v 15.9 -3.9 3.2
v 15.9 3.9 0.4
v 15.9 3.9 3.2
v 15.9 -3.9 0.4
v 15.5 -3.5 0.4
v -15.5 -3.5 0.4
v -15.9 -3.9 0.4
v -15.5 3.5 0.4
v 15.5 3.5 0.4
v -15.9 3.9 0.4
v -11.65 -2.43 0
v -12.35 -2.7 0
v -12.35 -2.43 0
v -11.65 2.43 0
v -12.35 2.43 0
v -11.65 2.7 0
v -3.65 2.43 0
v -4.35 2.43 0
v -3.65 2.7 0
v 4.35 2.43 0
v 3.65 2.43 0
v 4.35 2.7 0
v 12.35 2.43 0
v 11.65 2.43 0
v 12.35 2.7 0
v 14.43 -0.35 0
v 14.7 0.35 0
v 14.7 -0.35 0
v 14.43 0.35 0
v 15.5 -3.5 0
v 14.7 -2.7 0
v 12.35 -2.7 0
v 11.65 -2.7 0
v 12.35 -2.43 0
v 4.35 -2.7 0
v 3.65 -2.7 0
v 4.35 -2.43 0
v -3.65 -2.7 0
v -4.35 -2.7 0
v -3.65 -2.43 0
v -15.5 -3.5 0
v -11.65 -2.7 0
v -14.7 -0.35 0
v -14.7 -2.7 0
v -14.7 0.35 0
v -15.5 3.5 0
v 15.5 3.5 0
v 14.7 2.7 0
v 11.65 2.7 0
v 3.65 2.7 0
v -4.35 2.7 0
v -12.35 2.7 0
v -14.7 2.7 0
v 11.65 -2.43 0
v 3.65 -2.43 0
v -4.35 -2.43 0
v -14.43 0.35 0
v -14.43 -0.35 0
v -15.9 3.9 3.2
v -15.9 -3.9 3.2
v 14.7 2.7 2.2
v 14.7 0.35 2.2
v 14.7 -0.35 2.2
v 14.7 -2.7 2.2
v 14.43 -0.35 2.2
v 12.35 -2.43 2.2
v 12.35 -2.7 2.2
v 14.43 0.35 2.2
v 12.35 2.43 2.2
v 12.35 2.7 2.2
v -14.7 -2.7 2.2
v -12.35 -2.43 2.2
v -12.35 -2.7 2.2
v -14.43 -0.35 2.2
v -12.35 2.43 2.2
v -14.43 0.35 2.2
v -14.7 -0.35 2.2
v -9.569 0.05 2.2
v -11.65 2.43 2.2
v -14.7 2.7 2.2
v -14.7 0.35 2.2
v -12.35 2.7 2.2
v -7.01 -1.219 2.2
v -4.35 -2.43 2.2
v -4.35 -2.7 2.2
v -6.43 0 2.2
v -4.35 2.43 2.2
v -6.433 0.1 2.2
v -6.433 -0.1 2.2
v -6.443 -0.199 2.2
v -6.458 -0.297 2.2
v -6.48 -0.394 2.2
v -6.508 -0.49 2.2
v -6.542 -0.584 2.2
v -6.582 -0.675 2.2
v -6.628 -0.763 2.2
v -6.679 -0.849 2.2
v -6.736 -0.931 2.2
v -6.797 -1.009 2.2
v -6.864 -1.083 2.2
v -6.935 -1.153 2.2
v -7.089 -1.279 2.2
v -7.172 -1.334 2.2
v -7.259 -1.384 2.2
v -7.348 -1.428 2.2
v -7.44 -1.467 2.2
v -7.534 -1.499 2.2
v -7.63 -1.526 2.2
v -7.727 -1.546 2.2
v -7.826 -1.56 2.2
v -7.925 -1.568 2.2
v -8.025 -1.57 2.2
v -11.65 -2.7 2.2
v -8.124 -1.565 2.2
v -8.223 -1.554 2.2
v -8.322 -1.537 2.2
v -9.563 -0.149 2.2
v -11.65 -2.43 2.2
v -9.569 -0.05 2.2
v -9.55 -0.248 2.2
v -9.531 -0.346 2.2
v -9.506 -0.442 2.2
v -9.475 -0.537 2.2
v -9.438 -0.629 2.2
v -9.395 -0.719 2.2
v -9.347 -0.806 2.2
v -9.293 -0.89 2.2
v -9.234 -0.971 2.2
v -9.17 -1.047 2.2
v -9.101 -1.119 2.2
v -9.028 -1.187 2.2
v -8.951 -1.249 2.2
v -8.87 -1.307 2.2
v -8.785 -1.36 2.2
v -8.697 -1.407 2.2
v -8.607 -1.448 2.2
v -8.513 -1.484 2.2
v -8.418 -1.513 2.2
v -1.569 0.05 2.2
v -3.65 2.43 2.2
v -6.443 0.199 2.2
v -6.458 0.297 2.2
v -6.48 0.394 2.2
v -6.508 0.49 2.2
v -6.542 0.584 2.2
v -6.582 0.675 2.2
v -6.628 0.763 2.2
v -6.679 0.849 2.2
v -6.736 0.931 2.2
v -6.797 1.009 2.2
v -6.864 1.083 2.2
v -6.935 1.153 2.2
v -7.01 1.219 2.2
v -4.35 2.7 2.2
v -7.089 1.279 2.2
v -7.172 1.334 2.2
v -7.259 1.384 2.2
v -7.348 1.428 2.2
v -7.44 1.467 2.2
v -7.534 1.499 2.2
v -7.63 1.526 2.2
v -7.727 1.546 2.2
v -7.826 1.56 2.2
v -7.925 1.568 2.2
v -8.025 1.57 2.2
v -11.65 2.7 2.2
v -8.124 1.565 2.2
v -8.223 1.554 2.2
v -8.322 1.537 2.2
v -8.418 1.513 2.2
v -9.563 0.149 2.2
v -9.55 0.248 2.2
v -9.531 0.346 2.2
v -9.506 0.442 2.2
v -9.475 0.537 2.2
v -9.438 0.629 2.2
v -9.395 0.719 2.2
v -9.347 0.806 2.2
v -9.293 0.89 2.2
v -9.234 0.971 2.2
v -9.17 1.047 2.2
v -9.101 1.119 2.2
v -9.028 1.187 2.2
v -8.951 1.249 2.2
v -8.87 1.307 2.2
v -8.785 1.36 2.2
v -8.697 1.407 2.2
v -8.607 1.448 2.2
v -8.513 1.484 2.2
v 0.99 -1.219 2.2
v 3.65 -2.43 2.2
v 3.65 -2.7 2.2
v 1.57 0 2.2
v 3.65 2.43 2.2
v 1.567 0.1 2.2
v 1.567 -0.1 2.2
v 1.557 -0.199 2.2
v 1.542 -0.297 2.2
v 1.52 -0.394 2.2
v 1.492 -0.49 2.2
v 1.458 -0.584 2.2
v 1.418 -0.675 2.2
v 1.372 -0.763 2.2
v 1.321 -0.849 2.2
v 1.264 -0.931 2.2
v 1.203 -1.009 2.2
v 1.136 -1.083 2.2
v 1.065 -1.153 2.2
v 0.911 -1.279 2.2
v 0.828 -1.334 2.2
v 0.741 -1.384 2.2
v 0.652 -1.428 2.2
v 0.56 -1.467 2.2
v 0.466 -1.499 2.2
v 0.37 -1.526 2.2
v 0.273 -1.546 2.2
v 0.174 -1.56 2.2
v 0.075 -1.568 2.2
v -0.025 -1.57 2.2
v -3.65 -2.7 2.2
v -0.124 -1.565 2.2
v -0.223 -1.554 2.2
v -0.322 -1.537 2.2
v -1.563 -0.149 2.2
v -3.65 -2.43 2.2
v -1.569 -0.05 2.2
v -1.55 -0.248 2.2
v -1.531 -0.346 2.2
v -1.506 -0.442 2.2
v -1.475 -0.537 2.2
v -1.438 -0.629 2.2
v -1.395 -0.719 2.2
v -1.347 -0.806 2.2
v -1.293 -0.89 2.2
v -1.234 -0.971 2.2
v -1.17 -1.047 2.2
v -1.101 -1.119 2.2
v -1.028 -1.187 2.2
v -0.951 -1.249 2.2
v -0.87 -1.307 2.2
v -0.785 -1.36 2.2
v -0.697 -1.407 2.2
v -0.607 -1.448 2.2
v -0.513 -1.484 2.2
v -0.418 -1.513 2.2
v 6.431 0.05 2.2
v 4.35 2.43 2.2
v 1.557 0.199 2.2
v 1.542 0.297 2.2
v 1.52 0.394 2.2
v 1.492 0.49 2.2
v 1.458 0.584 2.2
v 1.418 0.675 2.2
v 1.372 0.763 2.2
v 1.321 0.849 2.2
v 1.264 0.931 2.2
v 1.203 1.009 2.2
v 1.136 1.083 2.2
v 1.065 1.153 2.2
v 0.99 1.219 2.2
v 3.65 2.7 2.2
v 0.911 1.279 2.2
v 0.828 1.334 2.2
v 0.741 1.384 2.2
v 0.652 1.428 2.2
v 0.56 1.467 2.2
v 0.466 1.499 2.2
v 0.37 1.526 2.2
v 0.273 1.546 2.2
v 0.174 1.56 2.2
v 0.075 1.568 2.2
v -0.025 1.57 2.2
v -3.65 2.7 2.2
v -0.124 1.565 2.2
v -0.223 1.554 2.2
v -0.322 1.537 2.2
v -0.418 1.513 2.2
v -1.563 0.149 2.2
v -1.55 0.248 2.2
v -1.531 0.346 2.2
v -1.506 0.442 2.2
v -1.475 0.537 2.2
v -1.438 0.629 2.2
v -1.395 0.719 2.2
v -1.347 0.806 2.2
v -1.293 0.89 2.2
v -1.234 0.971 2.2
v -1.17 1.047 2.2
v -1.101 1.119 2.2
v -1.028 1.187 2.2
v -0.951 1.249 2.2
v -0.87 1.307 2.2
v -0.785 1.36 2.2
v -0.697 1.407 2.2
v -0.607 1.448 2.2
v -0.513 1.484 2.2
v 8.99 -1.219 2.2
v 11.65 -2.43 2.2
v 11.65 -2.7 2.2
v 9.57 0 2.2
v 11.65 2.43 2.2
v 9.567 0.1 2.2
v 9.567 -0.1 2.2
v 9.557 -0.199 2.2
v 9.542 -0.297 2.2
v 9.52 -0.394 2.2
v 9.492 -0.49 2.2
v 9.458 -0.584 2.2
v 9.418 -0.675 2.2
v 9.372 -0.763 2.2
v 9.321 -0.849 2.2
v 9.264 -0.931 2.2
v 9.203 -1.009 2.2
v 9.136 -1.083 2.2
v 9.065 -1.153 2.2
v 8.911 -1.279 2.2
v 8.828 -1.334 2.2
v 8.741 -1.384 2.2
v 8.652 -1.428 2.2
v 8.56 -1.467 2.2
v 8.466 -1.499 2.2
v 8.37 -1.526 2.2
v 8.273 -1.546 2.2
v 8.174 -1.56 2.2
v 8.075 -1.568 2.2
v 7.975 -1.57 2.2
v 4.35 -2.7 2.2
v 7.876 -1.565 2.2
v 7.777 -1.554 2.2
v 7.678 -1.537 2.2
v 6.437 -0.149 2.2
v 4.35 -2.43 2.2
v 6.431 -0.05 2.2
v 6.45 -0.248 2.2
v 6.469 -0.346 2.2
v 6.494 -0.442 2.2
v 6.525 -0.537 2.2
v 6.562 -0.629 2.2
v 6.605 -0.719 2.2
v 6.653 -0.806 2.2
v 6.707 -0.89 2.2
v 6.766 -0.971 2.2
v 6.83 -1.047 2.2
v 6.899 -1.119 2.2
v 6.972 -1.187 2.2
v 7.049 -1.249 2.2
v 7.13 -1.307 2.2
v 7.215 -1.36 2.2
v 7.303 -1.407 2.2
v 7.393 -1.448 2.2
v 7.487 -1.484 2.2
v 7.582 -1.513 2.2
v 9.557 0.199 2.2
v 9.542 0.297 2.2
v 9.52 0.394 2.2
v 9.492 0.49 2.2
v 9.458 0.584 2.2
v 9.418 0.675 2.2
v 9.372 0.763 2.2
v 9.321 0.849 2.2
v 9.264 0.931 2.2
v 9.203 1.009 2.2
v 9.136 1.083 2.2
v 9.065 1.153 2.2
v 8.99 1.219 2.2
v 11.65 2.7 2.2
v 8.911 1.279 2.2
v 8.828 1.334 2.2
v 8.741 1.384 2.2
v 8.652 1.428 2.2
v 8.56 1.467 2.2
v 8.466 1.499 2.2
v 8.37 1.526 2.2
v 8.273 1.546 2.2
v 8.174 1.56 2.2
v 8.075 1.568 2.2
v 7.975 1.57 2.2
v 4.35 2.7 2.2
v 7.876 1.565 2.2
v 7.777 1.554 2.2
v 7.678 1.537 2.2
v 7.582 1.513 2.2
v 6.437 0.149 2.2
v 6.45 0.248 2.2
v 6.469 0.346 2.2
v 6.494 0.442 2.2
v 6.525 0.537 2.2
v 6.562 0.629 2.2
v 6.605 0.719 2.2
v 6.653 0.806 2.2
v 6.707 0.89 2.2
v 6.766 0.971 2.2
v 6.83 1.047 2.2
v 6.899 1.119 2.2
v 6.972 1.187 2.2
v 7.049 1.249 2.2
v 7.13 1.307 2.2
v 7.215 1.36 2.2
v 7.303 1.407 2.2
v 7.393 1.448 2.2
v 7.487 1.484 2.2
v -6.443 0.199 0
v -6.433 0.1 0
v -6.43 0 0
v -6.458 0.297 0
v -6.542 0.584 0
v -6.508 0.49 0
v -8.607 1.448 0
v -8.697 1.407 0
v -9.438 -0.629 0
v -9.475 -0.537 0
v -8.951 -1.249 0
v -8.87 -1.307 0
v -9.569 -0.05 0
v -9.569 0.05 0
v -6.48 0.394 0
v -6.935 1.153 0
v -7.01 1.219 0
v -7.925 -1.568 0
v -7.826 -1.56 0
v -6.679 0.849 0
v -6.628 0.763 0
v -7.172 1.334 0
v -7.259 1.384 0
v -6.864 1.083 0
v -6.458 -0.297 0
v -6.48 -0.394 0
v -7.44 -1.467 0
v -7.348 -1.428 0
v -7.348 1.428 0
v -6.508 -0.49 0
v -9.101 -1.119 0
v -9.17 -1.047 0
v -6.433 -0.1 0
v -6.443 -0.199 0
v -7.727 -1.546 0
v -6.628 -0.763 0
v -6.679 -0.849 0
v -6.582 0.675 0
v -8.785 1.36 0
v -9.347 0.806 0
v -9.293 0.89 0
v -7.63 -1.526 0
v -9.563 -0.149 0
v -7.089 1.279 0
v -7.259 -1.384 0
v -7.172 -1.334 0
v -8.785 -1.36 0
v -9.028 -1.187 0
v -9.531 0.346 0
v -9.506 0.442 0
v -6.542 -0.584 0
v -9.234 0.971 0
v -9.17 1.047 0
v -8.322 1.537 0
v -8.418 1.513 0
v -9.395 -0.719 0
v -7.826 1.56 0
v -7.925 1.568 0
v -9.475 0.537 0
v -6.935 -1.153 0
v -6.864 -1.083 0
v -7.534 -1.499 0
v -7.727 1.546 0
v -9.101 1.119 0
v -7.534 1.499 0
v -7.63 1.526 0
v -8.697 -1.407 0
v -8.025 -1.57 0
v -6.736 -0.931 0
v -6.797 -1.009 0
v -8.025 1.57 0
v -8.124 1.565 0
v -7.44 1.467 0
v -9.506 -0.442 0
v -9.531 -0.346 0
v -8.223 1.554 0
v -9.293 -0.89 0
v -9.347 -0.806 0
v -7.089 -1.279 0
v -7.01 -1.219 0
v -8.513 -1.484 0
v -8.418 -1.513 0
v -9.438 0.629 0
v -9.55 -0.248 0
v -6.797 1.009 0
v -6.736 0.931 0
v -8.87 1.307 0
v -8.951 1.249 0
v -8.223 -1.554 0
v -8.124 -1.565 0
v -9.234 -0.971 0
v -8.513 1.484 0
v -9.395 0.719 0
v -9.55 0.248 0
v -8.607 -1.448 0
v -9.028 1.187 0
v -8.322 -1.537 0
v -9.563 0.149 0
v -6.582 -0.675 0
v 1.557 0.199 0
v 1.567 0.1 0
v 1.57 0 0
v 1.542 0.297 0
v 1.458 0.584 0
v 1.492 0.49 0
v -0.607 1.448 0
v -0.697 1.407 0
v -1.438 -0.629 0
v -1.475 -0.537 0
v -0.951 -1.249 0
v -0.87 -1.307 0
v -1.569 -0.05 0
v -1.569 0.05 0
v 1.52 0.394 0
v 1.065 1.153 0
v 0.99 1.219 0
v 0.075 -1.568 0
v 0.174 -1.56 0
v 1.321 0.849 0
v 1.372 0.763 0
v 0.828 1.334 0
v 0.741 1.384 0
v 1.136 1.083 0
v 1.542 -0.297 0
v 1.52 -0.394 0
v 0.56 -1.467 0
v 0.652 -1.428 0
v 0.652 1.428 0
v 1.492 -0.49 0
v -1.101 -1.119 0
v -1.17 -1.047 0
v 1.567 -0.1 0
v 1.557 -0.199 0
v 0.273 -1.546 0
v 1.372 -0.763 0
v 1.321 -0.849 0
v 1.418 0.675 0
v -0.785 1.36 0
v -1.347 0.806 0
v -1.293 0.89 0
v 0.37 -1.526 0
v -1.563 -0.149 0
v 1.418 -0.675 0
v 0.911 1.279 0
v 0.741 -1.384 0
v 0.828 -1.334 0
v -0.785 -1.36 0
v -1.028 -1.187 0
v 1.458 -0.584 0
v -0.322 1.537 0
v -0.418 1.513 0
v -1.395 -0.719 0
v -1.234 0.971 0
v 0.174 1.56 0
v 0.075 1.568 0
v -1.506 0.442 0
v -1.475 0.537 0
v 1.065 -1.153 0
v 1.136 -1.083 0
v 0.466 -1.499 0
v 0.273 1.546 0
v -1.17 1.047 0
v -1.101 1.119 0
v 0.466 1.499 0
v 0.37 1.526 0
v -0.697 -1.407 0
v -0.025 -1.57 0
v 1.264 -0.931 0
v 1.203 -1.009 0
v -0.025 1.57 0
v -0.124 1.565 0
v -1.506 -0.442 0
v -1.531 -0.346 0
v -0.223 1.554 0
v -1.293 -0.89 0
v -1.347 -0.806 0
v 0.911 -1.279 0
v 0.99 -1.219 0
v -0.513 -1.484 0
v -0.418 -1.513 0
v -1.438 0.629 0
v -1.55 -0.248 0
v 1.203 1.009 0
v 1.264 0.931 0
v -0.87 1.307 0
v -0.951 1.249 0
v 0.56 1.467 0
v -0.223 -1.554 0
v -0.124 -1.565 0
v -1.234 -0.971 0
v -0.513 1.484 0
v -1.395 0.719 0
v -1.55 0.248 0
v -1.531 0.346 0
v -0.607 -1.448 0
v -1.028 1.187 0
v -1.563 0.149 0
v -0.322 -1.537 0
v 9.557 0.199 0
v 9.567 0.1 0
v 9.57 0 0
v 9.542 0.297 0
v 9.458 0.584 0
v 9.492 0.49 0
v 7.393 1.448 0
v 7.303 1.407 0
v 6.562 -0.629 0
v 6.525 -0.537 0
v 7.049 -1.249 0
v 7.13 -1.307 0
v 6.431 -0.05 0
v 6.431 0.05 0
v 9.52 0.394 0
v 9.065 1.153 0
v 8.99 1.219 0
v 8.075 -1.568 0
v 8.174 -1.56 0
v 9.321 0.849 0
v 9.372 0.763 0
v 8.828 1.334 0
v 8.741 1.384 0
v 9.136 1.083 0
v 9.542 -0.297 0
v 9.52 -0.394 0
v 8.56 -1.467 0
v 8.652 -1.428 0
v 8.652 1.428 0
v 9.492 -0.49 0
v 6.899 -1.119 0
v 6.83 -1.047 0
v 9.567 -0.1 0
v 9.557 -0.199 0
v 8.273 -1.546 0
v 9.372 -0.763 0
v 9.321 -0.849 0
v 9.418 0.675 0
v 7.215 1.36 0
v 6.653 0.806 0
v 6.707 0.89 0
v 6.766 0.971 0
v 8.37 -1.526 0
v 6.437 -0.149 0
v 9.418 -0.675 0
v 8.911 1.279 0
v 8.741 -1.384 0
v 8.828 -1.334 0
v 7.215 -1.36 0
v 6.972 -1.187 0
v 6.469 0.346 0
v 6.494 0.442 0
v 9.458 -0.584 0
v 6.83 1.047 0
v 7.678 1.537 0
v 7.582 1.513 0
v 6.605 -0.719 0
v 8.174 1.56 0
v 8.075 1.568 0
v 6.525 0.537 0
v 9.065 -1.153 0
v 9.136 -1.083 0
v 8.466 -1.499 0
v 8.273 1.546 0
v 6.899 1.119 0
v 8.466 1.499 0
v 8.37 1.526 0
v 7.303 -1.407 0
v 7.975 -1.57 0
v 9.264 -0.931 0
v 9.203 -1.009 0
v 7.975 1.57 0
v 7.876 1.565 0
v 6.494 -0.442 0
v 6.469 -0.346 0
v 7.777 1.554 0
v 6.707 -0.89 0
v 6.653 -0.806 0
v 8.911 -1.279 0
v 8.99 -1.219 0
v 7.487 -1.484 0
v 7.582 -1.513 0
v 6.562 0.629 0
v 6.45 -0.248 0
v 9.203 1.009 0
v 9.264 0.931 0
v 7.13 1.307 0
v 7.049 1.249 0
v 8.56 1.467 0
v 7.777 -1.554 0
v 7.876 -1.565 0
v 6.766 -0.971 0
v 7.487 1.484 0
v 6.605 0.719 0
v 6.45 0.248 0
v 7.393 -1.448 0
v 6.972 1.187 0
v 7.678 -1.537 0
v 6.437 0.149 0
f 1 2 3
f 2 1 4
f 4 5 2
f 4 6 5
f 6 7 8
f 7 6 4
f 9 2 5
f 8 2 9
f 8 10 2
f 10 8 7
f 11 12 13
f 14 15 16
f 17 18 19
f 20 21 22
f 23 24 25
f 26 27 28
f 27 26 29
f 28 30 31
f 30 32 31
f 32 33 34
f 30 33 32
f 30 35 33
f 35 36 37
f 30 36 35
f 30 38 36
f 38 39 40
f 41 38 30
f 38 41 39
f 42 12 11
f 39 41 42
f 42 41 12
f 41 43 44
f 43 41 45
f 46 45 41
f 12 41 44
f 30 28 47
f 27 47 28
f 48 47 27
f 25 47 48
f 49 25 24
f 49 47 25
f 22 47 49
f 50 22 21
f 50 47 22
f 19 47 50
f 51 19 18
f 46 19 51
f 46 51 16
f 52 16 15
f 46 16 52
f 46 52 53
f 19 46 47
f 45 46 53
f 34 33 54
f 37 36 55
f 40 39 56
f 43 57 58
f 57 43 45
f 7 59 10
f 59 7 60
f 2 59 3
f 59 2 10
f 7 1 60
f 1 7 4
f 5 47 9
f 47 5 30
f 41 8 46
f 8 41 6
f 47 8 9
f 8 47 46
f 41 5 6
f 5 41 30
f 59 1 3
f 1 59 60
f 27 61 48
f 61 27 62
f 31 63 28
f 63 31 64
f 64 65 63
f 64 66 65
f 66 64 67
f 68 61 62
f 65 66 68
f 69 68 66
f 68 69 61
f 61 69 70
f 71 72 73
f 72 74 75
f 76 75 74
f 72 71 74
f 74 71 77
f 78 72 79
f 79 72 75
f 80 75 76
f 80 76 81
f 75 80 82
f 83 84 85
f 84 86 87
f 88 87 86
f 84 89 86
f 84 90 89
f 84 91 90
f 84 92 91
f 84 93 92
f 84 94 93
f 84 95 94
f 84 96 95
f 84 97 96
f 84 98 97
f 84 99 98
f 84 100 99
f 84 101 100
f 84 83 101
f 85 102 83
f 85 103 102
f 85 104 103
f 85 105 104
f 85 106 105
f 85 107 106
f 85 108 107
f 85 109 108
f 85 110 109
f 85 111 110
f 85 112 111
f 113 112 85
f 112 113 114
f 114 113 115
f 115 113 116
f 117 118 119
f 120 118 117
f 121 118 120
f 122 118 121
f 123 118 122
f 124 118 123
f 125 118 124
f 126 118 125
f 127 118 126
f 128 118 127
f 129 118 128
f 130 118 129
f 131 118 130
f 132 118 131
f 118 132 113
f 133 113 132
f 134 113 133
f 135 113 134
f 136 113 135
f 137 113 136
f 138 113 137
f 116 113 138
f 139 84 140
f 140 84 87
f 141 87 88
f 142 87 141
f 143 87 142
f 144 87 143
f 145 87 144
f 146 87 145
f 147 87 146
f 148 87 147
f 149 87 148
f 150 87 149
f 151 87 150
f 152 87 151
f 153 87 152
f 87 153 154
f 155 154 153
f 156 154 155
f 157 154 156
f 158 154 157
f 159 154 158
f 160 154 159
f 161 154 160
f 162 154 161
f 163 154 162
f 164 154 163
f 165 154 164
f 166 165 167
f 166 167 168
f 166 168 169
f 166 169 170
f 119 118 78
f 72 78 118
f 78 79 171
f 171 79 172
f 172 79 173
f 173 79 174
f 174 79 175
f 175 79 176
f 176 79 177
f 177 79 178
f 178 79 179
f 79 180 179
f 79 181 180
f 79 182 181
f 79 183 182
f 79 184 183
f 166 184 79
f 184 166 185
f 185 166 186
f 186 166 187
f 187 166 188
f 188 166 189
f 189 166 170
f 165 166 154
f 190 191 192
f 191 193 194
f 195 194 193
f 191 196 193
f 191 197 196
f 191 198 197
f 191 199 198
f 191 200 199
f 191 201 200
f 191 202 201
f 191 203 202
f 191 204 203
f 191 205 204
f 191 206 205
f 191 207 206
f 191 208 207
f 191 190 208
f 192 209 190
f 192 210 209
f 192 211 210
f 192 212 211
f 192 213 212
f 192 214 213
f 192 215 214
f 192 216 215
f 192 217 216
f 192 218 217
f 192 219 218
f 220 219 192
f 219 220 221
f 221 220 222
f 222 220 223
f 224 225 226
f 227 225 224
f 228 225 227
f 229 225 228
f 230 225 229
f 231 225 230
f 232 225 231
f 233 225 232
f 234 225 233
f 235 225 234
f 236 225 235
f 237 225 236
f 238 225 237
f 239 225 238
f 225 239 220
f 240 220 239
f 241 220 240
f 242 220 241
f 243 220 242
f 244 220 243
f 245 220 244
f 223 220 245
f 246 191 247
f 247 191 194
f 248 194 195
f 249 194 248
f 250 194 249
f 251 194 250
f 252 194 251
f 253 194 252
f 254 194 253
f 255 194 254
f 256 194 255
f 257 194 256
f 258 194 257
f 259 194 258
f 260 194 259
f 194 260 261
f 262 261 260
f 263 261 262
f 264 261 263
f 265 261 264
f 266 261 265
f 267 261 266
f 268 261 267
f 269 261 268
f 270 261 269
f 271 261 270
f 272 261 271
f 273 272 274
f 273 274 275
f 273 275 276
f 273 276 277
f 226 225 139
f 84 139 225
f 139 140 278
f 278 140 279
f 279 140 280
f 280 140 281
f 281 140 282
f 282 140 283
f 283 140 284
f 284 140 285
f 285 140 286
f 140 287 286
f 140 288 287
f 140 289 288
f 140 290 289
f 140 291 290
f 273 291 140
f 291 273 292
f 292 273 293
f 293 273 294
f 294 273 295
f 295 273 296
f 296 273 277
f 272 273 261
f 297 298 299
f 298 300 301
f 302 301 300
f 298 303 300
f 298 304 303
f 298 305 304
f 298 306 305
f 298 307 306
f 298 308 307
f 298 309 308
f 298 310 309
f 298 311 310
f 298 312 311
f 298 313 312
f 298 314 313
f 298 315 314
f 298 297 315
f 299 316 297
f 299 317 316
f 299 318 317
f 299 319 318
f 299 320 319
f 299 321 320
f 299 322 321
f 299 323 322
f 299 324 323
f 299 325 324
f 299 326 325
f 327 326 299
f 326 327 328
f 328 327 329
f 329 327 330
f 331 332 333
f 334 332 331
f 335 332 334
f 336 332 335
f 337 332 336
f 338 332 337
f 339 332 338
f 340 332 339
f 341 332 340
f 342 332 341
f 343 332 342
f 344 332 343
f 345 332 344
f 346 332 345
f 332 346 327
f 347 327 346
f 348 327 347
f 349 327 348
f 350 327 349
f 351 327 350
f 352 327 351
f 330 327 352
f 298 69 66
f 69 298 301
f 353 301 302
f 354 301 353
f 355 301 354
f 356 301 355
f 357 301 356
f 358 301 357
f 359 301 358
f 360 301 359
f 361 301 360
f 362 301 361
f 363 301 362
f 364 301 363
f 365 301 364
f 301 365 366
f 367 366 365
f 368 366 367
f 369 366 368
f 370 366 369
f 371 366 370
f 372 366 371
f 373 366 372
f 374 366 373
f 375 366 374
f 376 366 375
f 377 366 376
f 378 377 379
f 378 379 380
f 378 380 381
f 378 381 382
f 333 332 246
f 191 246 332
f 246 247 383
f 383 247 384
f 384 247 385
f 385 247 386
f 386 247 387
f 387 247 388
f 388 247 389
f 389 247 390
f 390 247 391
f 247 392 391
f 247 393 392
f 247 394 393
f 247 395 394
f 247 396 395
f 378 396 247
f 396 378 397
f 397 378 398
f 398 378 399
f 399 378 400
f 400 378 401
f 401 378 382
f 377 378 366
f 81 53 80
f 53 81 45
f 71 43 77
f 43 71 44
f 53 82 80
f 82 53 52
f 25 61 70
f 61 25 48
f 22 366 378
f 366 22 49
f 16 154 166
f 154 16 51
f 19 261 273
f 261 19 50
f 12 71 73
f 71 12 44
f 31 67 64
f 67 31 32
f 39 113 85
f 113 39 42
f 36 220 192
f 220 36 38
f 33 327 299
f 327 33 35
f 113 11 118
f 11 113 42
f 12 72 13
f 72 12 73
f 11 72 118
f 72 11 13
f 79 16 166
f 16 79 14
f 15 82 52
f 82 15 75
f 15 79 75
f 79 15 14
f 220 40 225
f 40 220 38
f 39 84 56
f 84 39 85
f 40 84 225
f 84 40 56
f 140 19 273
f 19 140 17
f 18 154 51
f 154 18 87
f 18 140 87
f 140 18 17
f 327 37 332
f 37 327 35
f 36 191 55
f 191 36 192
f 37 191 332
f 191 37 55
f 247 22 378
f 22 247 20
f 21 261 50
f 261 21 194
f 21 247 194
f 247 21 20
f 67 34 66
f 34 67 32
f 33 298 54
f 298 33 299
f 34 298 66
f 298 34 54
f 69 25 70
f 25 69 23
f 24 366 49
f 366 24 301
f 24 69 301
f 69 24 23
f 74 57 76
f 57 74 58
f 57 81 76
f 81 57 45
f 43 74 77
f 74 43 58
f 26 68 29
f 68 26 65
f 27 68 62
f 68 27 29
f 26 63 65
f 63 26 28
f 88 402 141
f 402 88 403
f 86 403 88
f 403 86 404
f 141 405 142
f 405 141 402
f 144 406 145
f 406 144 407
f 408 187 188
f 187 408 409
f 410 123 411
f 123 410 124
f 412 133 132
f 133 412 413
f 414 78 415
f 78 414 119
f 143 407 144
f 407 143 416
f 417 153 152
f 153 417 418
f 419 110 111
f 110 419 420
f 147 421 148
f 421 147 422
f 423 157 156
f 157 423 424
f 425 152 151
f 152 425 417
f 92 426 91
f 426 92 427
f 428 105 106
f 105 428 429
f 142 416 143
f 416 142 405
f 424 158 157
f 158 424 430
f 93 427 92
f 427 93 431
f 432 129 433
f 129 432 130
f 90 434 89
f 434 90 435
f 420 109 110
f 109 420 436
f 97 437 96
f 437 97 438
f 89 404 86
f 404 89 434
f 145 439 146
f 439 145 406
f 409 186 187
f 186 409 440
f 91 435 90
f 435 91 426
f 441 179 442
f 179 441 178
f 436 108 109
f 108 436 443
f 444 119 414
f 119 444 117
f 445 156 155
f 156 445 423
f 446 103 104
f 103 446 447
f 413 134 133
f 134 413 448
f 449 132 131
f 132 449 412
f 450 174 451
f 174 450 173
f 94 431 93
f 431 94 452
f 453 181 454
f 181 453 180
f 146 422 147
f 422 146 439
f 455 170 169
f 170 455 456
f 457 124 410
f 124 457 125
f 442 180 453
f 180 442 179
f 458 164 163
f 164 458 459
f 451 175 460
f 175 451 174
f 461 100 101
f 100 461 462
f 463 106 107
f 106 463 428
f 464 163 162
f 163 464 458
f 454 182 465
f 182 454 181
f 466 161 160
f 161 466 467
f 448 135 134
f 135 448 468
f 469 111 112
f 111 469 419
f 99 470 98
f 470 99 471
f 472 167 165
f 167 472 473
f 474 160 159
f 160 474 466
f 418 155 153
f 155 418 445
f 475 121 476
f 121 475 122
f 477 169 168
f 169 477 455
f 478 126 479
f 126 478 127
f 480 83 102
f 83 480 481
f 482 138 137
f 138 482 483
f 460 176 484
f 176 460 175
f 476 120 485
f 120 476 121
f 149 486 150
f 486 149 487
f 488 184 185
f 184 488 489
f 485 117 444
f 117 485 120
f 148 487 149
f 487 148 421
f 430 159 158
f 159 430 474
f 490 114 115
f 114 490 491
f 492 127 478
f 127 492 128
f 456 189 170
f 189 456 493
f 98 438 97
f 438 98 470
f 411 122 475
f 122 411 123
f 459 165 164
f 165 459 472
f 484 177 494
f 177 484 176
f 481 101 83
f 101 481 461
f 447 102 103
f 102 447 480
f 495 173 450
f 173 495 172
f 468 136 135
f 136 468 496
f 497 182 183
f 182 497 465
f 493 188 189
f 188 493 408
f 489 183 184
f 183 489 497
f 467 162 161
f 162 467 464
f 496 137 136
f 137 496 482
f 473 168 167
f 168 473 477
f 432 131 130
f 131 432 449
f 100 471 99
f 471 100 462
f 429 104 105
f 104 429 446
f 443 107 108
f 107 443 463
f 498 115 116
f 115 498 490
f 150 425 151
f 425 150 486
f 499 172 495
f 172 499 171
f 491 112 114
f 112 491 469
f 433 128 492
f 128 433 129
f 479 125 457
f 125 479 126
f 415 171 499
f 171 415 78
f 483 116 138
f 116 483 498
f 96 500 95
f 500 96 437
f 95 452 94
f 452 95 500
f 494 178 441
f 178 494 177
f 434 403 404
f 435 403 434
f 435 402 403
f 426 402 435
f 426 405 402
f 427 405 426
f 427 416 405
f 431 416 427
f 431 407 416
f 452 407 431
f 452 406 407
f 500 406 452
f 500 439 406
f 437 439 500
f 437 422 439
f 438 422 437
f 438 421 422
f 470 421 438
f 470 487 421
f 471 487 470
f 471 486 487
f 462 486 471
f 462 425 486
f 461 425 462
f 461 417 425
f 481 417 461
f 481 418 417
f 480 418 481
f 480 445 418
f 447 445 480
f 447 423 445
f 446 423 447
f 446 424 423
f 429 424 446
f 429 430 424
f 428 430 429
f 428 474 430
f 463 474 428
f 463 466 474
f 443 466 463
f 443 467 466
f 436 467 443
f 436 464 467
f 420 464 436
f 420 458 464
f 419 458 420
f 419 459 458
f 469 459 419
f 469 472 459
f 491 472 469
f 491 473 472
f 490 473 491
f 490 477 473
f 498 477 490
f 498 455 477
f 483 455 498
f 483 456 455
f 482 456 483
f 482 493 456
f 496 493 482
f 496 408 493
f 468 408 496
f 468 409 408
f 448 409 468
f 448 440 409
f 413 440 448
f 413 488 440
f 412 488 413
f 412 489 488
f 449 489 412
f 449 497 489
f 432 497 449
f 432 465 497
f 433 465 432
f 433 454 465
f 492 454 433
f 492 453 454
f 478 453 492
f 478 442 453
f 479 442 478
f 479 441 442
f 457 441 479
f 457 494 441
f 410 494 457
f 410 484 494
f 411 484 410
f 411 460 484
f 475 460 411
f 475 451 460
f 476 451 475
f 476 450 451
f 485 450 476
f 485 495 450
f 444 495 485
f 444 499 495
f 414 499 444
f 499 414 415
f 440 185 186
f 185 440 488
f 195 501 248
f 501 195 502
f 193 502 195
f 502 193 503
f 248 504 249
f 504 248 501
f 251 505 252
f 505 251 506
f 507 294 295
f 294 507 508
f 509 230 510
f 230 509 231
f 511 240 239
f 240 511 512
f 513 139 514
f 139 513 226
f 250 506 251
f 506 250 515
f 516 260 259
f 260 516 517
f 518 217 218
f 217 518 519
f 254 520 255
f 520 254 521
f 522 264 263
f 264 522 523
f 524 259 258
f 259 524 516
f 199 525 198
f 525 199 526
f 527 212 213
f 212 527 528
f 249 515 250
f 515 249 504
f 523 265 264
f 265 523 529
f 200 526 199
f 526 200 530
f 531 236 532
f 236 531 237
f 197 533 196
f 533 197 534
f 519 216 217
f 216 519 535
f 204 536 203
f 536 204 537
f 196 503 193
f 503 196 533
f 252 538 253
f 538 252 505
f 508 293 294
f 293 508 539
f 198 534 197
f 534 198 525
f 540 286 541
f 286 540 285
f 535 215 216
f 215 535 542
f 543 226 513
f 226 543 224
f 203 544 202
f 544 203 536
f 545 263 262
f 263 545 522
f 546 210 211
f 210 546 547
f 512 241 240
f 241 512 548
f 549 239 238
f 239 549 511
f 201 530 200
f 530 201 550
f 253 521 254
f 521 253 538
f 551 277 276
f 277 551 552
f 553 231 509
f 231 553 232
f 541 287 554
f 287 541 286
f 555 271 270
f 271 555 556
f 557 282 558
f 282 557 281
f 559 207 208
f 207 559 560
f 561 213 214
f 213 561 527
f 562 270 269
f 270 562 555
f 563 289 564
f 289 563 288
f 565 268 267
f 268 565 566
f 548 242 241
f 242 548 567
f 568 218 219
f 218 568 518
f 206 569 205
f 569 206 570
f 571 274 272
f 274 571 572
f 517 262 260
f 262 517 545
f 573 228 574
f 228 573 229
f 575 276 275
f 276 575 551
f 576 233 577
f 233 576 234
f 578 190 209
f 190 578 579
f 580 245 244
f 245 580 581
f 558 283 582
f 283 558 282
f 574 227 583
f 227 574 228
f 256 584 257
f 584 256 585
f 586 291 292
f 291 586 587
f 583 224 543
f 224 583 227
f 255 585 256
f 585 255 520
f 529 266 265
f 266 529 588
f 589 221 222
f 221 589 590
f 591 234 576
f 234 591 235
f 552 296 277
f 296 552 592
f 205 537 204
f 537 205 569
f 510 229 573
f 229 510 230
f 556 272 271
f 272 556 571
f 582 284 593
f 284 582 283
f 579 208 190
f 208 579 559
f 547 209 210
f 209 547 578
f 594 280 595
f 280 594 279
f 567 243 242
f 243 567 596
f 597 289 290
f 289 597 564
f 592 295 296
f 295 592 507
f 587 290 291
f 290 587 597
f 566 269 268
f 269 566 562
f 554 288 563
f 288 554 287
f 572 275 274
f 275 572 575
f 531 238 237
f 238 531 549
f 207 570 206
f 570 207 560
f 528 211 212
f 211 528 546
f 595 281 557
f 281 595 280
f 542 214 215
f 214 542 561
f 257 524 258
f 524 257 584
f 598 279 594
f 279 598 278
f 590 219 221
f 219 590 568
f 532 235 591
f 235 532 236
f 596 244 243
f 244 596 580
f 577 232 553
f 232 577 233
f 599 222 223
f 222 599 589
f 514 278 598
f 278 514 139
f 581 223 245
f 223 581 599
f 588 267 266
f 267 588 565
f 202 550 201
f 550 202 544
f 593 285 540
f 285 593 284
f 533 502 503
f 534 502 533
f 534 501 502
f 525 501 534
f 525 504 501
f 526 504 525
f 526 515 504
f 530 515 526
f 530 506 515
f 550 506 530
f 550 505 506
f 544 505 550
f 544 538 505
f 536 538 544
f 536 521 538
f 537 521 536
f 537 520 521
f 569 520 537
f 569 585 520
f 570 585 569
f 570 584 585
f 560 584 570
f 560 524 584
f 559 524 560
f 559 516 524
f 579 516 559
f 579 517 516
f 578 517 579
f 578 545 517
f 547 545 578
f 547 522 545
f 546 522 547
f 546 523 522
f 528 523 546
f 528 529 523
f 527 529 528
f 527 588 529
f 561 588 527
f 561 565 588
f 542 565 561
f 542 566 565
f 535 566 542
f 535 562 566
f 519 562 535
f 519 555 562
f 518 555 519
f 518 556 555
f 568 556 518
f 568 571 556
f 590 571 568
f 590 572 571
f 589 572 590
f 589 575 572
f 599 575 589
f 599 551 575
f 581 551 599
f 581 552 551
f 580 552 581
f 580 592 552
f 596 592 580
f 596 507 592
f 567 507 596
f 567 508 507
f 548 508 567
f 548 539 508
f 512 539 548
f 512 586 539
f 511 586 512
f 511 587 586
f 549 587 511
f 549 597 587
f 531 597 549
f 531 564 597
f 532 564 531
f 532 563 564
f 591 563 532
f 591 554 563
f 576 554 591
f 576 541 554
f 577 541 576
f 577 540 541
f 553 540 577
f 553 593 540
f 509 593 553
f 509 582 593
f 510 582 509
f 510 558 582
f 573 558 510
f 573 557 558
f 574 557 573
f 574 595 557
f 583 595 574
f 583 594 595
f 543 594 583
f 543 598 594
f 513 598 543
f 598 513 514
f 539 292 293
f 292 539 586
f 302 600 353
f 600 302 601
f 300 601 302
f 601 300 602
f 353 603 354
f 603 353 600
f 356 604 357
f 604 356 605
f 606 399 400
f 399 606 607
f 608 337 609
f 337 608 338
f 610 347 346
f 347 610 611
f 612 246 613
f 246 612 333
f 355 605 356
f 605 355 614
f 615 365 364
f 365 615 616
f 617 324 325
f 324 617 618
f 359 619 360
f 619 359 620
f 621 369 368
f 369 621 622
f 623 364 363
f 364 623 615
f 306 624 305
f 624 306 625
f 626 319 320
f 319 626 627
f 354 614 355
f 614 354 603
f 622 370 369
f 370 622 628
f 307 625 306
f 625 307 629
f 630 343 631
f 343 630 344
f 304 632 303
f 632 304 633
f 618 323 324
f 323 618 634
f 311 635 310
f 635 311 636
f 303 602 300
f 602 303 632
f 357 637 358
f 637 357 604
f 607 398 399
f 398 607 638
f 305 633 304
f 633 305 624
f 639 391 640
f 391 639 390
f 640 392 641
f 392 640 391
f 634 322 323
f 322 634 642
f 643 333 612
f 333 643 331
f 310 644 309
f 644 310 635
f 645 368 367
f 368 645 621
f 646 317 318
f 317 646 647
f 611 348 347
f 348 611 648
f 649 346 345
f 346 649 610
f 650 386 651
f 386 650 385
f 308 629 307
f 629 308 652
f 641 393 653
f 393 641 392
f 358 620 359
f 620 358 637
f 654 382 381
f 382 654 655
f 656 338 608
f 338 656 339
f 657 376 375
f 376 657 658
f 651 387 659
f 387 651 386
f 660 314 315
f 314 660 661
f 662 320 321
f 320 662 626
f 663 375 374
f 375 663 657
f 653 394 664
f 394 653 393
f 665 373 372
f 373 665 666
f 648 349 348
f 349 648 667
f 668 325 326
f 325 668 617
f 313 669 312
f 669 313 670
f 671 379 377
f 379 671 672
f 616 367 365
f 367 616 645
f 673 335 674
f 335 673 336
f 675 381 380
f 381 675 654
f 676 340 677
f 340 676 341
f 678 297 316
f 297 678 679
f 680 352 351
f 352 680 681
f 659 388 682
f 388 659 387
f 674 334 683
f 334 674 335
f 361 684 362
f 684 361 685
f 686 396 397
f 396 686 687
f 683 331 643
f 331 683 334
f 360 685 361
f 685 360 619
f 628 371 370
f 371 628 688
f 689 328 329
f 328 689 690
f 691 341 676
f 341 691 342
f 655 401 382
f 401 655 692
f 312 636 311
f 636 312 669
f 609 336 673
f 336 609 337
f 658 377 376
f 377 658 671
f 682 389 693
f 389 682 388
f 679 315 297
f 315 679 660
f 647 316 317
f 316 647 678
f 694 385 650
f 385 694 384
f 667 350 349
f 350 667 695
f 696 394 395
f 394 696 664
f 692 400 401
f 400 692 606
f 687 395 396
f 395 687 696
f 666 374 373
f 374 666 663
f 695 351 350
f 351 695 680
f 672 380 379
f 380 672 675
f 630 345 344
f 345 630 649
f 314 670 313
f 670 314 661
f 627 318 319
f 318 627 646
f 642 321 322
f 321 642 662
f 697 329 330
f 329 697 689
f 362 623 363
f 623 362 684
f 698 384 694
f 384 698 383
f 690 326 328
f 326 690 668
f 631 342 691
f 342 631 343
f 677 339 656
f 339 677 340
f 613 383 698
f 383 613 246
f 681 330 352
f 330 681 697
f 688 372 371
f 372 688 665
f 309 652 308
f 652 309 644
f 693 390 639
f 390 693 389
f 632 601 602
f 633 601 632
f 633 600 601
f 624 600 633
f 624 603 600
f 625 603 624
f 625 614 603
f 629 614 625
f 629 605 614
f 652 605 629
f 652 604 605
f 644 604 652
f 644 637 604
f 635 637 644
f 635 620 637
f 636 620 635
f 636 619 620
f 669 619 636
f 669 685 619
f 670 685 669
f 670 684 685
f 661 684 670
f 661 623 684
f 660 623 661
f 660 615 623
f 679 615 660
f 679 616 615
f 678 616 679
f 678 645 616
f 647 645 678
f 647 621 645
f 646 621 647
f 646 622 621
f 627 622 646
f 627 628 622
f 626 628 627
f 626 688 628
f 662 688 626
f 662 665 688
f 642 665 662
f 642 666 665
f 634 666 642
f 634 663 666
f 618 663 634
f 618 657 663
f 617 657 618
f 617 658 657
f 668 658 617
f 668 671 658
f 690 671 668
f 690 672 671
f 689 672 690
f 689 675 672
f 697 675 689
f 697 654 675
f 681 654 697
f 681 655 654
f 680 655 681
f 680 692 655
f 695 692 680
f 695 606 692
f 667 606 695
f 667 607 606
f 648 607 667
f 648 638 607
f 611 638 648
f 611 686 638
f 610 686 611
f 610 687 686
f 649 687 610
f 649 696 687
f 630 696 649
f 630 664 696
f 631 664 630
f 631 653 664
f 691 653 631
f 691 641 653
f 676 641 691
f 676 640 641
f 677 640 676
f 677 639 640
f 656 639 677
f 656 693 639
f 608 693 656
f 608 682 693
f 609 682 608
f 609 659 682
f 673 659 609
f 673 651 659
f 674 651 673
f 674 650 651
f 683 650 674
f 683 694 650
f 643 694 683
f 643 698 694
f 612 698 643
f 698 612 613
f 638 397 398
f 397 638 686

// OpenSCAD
use <../LEGO.scad>;

block( width=1, length=4, height=1/3, type="tile" );
